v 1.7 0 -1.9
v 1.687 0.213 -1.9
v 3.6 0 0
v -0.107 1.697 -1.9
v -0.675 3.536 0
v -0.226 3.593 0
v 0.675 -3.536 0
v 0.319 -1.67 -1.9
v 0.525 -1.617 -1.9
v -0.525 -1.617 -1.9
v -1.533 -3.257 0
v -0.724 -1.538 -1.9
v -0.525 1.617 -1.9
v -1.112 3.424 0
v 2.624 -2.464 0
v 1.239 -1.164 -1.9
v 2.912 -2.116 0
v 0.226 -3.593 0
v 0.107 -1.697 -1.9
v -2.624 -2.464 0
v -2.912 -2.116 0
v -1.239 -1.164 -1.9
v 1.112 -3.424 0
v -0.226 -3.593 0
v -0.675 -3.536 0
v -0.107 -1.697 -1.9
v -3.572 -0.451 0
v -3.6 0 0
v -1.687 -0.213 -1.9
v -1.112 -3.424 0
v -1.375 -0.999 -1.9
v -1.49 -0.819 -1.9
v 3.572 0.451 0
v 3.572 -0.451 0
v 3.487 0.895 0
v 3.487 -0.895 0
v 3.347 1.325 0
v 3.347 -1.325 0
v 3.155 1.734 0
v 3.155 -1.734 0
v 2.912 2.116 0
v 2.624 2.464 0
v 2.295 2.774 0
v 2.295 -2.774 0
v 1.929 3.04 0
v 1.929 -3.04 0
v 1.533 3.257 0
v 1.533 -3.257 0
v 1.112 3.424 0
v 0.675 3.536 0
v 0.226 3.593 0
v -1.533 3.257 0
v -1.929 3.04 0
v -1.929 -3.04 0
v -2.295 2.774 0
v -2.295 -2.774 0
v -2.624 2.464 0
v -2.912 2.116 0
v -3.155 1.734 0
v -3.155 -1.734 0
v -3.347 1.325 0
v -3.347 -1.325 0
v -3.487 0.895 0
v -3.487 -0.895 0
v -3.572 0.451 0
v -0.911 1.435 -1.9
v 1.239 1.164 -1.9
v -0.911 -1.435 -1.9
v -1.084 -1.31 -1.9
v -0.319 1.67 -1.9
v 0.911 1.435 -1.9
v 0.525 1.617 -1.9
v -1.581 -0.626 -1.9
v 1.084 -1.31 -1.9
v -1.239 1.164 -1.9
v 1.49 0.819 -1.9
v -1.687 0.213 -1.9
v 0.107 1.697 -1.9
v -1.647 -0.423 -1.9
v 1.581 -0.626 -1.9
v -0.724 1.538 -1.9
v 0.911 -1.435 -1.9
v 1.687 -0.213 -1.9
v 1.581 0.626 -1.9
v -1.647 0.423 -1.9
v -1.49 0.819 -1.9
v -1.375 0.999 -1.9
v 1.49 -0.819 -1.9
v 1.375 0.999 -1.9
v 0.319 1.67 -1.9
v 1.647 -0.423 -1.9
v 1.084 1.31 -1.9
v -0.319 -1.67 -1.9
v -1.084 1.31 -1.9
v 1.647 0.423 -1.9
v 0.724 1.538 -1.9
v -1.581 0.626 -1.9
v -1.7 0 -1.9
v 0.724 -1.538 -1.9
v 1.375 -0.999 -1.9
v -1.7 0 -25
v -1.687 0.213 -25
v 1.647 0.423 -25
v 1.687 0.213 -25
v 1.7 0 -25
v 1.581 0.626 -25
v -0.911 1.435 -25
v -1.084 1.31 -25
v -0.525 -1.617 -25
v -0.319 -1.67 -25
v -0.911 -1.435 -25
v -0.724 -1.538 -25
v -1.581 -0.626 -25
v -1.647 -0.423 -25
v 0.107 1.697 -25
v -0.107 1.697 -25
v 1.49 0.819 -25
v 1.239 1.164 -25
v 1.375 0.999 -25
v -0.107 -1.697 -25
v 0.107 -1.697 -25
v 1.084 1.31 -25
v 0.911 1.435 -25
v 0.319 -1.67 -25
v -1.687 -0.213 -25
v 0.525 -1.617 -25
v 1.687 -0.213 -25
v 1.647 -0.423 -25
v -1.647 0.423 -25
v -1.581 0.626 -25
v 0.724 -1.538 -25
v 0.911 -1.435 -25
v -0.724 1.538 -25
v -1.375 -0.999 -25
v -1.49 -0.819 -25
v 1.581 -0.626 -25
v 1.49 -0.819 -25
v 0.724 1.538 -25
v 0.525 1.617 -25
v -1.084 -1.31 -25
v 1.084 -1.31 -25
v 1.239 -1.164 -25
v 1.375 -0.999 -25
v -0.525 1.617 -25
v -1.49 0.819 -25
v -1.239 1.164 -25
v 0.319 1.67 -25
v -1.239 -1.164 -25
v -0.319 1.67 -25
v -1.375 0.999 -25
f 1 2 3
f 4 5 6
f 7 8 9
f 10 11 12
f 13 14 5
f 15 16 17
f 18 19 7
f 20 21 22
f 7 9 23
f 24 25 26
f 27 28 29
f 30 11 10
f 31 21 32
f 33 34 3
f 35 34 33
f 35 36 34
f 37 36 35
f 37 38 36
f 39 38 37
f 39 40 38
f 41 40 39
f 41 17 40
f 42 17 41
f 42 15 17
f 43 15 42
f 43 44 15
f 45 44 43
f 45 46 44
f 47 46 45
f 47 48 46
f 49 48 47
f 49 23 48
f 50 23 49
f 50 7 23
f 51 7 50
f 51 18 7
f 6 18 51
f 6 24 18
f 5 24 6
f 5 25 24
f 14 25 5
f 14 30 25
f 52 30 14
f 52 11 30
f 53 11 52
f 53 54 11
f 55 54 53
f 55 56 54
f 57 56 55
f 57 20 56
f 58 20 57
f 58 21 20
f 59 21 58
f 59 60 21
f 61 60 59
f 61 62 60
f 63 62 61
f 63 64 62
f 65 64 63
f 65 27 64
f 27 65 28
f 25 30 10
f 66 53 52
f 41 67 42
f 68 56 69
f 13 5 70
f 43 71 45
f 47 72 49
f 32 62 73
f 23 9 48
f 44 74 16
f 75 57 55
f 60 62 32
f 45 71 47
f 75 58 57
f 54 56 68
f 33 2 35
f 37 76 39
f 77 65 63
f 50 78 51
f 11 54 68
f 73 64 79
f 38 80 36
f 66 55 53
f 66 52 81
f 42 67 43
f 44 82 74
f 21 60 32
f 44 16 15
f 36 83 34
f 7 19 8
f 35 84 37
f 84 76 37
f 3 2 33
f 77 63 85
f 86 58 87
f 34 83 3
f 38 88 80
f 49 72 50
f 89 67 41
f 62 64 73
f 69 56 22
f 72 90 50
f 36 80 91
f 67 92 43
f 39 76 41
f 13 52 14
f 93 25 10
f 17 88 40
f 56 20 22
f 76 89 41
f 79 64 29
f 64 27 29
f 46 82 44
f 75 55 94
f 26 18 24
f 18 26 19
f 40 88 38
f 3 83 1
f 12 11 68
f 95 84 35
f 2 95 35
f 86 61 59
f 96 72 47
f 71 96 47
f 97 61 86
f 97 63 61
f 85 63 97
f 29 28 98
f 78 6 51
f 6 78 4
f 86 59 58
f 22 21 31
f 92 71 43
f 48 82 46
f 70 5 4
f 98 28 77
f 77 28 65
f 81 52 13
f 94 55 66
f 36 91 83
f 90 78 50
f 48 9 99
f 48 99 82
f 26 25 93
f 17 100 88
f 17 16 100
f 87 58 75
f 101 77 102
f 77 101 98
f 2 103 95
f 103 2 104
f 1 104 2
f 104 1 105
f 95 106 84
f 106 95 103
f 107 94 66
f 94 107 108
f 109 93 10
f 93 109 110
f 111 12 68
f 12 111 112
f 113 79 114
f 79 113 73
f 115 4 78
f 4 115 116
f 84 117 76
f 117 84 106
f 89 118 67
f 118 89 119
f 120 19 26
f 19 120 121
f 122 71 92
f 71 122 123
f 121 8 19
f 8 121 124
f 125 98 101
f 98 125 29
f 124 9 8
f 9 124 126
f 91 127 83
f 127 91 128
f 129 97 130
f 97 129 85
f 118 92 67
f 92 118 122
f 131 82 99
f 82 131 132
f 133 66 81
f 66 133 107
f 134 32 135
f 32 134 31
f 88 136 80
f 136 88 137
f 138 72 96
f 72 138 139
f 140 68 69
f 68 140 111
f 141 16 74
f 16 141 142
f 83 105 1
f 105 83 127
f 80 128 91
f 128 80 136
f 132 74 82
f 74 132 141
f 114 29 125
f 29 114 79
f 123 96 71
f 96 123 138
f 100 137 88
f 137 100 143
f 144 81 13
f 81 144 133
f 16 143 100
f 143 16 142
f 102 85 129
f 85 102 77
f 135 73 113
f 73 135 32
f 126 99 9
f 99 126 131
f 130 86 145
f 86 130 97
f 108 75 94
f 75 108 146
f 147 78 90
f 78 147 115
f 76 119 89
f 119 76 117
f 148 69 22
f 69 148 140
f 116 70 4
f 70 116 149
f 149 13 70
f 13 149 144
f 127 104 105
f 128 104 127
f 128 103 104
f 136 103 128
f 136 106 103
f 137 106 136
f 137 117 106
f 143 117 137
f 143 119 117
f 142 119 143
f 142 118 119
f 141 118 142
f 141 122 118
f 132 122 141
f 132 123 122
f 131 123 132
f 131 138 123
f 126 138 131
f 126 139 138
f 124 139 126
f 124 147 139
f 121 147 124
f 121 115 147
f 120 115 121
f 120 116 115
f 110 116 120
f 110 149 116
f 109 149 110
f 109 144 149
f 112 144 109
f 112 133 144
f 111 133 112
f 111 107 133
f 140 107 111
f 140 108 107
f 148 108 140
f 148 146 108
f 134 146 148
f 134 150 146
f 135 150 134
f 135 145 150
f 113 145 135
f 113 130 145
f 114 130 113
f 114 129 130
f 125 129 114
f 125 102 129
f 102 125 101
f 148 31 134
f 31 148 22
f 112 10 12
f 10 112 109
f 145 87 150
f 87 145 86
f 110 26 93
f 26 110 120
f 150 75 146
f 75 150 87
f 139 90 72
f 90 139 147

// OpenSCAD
// Generated by SolidPython 1.1.3 on 2023-03-13 21:43:02
$fn = 50;


difference() {
	union() {
		translate(v = [0, 0, -1.9000000000]) {
			rotate(a = [0, 0, 0]) {
				cylinder(h = 1.9000000000, r1 = 1.7000000000, r2 = 3.6000000000);
			}
		}
		translate(v = [0, 0, -25]) {
			rotate(a = [0, 0, 0]) {
				cylinder(h = 25, r = 1.7000000000);
			}
		}
	}
	union();
}
/***********************************************
*********      SolidPython code:      **********
************************************************
 
from solid import *
import os
import subprocess

import oomB

import opsc_library_gen

mode = "laser"
#mode = "3d_print"

defined_objects = {}

radius_dict = {}
countersunk_dict = {}


def set_mode(m):
    global mode
    mode = m
    radius_dict['M6'] = 6.5/2
    radius_dict['M3'] = 3.3/2
    if mode == "laser":
        radius_dict['M6'] = 6/2
        radius_dict['M3'] = 3/2

    countersunk_dict['M3'] = {}
    countersunk_dict['M3']['little_rad'] = radius_dict['M3']
    countersunk_dict['M3']['big_rad'] = (5.5+0.6)/2
    if mode == "laser":
        countersunk_dict['M3']['big_rad'] = (4.75+0.6)/2
        countersunk_dict['M3']['little_rad'] = (4.75+0.6)/2

    countersunk_dict['M3']['height'] = 1.7


def opsc_make_object(filename, objects, save_type="none",resolution=50, layers = 1, tilediff = 200, mode="laser", overwrite=True):
    if overwrite or not os.path.exists(filename):
        set_mode(mode)
        save_type = save_type.lower()
        os.makedirs(os.path.dirname(filename), exist_ok=True)
        final_object = opsc_get_object(objects, mode = mode)
        # Save the final object to the specified filename    
        scad_render_to_file(final_object, filename, file_header='$fn = %s;' % resolution, include_orig_code=True)
        if save_type == "all":
            saveToAll(filename)
        elif save_type == "dxf":
            saveToDxf(filename)
        if mode == "laser":
            filename_laser = filename.replace(".scad","-flat.scad")
            scad_render_to_file(getLaser(final_object, layers=layers, tilediff=tilediff), filename_laser, file_header='$fn = %s;' % resolution, include_orig_code=True)
            if save_type == "all":
                saveToAll(filename_laser)
            elif save_type == "dxf":
                saveToDxf(filename_laser)


def opsc_get_object(objects, mode = "laser"):
    # Create the solidpython objects only include the positive objects and if they don't have inclusion or their inclusion is either all or mode
    # Initialize an empty list to store the results
    positive_objects = []

    # Iterate over the "objects" list
    for obj in objects:
        # Check if the current object has a "type" key with a value of "positive"
        if obj['type'] == 'positive':
            # Check if the current object has an "inclusion" key and its value matches "mode",
            # or if the current object does not have an "inclusion" key at all
            if not 'inclusion' in obj or obj['inclusion'] == "all" or obj['inclusion'] == mode:
                # Call the "get_opsc_item" function with the current object as an argument
                opsc_item = get_opsc_item(obj)
                # Add the result to the "positive_objects" list
                positive_objects.append(opsc_item)
# Initialize an empty list to store the results
    negative_objects = []

    # Iterate over the "objects" list
    for obj in objects:
        # Check if the current object has a "type" key with a value of "negative"
        if obj['type'] == 'negative':
            # Check if the current object has an "inclusion" key and its value matches "mode",
            # or if the current object does not have an "inclusion" key at all
            if not 'inclusion' in obj or obj['inclusion'] == "all" or obj['inclusion'] == mode:
                # Call the "get_opsc_item" function with the current object as an argument
                opsc_item = get_opsc_item(obj)
                # Add the result to the "negative_objects" list
                negative_objects.append(opsc_item)
    
    #positive_objects = [get_opsc_item(obj) for obj in objects if obj['type'] == 'positive']
    #negative_objects = [get_opsc_item(obj) for obj in objects if obj['type'] == 'negative']
    # Union the positive objects
    positive_object = union()(*positive_objects)
    # Union the negative objects
    negative_object = union()(*negative_objects)
    # Create the final object by subtracting the negative objects from the positive objects
    return difference()(positive_object, negative_object)

def get_opsc_item(params):
    # A dictionary to map radius string values to numerical values
    #radius_dict = {'small': 5, 'medium': 10, 'large': 15}
    # An array of function names for basic shapes
    basic_shapes = ['cube', 'sphere', 'cylinder']
    
    # An array of function names for other shapes
    other_shapes = ['hole', 'slot', 'rounded_rectangle', 'countersunk', 'polyg']
    


    # Convert radius to r if present, and remove radius from the params dictionary
    if 'radius' in params:
        if isinstance(params['radius'], str):
            # Use the radius_dict to map the radius string value to a numerical value
            params['r'] = radius_dict[params['radius']]
        else:
            params['r'] = params['radius']
        del params['radius']
    

    # Check if the object type is a basic shape
    if params['shape'] in basic_shapes:
        # Remove shape and unexpected dictionary values
        allowed_keys = {'size', 'r', 'r1', 'r2', 'd', 'h', 'rw', 'rh', 'dw', 'dh'}
        shape_params = {k: v for k, v in params.items() if k in allowed_keys}

        #params['m'] = "#"
        ###split for adding modifier
        try:
            m = params['m']
            func = globals()[params['shape']]
            return_value = get_opsc_transform(params,func(**shape_params))
            return_value = (return_value).set_modifier(m)
            return return_value
        except KeyError as e:
            return get_opsc_transform(params,globals()[params['shape']](**shape_params))
        
    elif params['shape'] == 'polygon':
        # Remove shape and unexpected dictionary values
        h  = params['height']
        allowed_keys = {'points'}
        shape_params = {k: v for k, v in params.items() if k in allowed_keys}

        # Call the corresponding function for the shape parameter, using ** notation to pass the shape_params dictionary as keyword arguments
        params["rot"] = [0,0,0]        
        try:
            m = params['m']
            func = globals()[params['shape']]
            return_value = get_opsc_transform(params,linear_extrude(h)(globals()[params['shape']](**shape_params)))
            return_value = (return_value).set_modifier(m)
            return return_value
        except KeyError as e:
            return_value = get_opsc_transform(params,linear_extrude(h)(globals()[params['shape']](**shape_params)))
            return_value = (return_value)
            return return_value


    # If the object type is not a basic shape, check if it's a defined object or one of the other shapes
    elif params['shape'] in other_shapes:
        # Call the corresponding function for the shape parameter, passing the params dictionary as an argument
        p2 = copy.deepcopy(params)
        p2["pos"] = [0,0,0]
        return get_opsc_transform(params,globals()[params['shape']](p2))
    
    # If the object is not a basic shape or a defined object, try to import it from a .scad file
    else:
        obj = defined_objects[params['shape']]
        return get_opsc_transform(params,obj)

def get_opsc_transform(params, solid_obj):
    # Rotate the object based on the 'rot' field in the params dictionary, or the 'rotX', 'rotY', and 'rotZ' fields if 'rot' is not present
    rot = params.get('rot', [])
    if rot:
        rotX, rotY, rotZ = rot
    else:
        rotX = params.get('rotX', 0)
        rotY = params.get('rotY', 0)
        rotZ = params.get('rotZ', 0)
    solid_obj = rotate([rotX, rotY, rotZ])(solid_obj)

    # Translate the object based on the 'pos' field in the params dictionary, or the 'x', 'y', and 'z' fields if 'pos' is not present
    pos = params.get('pos', [])
    if pos:
        x, y, z = pos
    else:
        x = params.get('x', 0)
        y = params.get('y', 0)
        z = params.get('z', 0)
    solid_obj = translate([x, y, z])(solid_obj)
    return solid_obj


import random

def opsc_easy_array(type, shape, repeats, pos_start, shift_arr, **kwargs):
    for i in range(0,3):
        repeats.append(1)
        pos_start.append(0)
        shift_arr.append(0)
    return_objects = []

    for x in range(0,repeats[0]):
        for y in range(0,repeats[1]):
            for z in range(0,repeats[2]):
                return_objects.append(opsc_easy(type, shape, pos=[pos_start[0]+x*shift_arr[0],pos_start[1]+y*shift_arr[1],pos_start[2]+z*shift_arr[2]], **kwargs))
    return return_objects                



def opsc_easy(type, shape, **kwargs):
    obj = {
        'type': type,
        'shape': shape
    }
    for param in ['size', 'r', 'r1', 'r2', 'd', 'h', 'rw', 'rh', 'dw', 'dh', 'pos', 'x', 'y', 'z', 'rot', 'rotX', 'rotY', 'rotZ', "w", "inclusion", 'sides', 'height', "m"]:
        if param in kwargs:
            obj[param] = kwargs[param]
    return obj

def hole(params):
    p2 = copy.deepcopy(params)  
    # Check if the radius is a string and replace it with the corresponding value from the dictionary
    if isinstance(p2['r'], str):
        p2['r'] = radius_dict[p2['r']]
    
    # Set the height to 100 if not specified
    if 'h' not in p2:
        p2['h'] = 100
        p2["pos"] = [0,0,-50]
    p2["center"] = True
    # Create the cylinder object
    p2["shape"] = "cylinder"
    p2["type"] = "positive"

    return get_opsc_item(p2)

import copy

def countersunk(params):
    p2 = copy.deepcopy(params)
    counter_rad = p2['r']
    p2['r'] = radius_dict[p2['r']]
    hp = copy.deepcopy(p2)
    hp["type"] = "positive"
    hp["shape"] = "hole"
    del hp["rot"]
    hol = get_opsc_item(hp)
    
    cp = copy.deepcopy(p2)
    cp["h"] = countersunk_dict[counter_rad]["height"]
    cp["r2"] = countersunk_dict[counter_rad]["little_rad"]
    cp["r1"] = countersunk_dict[counter_rad]["big_rad"]
    del cp["r"]
    del cp["rot"]
    cp["type"] = "positive"
    cp["shape"] = "cylinder"
    cp["pos"] = [0,0,0]

    top = get_opsc_item(cp)
    return union()(hol,top)



def slot(params):  
    p2 = copy.deepcopy(params) 
    if isinstance(p2['r'], str):
        p2['r'] = radius_dict[p2['r']]
    p2["type"] = "positive"
    p2["shape"] = "hole"
    del p2["rot"]
    p2["pos"] = [0,0,0]
    left = copy.deepcopy(p2)
    right = copy.deepcopy(p2)
    left["pos"][0] = p2["w"] / 2 - p2["r"] 
    
    right["pos"][0] = -p2["w"] / 2 + p2["r"] 
    pass
    leftObj = get_opsc_item(left)
    rightObj = get_opsc_item(right)
    return hull()(leftObj, rightObj)

def rounded_rectangle(params):   
    p2 = copy.deepcopy(params) 
    p2["h"] = p2["size"][2]
    p2["pos"] = p2.get("pos", [0, 0, 0]) 
    p2["type"] = "positive"
    p2["shape"] = "hole"
    p2["pos"] = [0,0,0]
    
    if 'rot' in p2:
        del p2["rot"]   
    if 'r' not in p2:
        p2["r"] = 5 
    tl = copy.deepcopy(p2)
    tr = copy.deepcopy(p2)
    bl = copy.deepcopy(p2)
    br = copy.deepcopy(p2)
    tl["pos"][0] = -(p2["size"][0] - p2["r"]*2)/2
    tl["pos"][1] = (p2["size"][1] - p2["r"]*2)/2
    tr["pos"][0] = (p2["size"][0] - p2["r"]*2)/2
    tr["pos"][1] = (p2["size"][1] - p2["r"]*2)/2
    bl["pos"][0] = -(p2["size"][0] - p2["r"]*2)/2
    bl["pos"][1] = -(p2["size"][1] - p2["r"]*2)/2
    br["pos"][0] = (p2["size"][0] - p2["r"]*2)/2
    br["pos"][1] = -(p2["size"][1] - p2["r"]*2)/2
    del tl["size"]
    del tr["size"]
    del bl["size"]
    del br["size"]
    tlo = get_opsc_item(tl)
    tro = get_opsc_item(tr)
    blo = get_opsc_item(bl)
    bro = get_opsc_item(br)    
    return hull()(tlo, tro, blo, bro)



def polyg(params):
    p2 = copy.deepcopy(params) 
    p2["type"] = "positive"
    p2["shape"] = "polygon"
    p2["pos"] = [0,0,0]
    sides = p2["sides"]
    radius = p2["r"]    
    angles = [i * 360 / sides for i in range(sides)]
    points = regular_polygon(sides, radius)
    
    p2["points"] = points
    return get_opsc_item(p2)

import math

def regular_polygon(num_sides, radius):
    # Calculate the angle between each side
    angle = 2 * math.pi / num_sides

    # Calculate the points of the polygon
    points = []
    for i in range(num_sides):
        x = radius * math.cos(i * angle)
        y = radius * math.sin(i * angle)
        points.append((x, y))
    return points

def import_scad_object(filename):
    # Import the .scad file and convert it to a solidpython object
    #filename = "parts"
    obj = import_scad(filename)
    return obj.main()



import os
import solid as solidpython

# A dictionary to store the defined objects


def load_scad_objects():
    opsc_library_gen.gen_library(defined_objects)

import random

def test(num_objects):
    objects = []
    for i in range(num_objects):
        # Choose a random shape
        #shape = random.choice(['cube', 'sphere', 'cylinder', 'hole', 'slot', "rounded_rectangle"])
        shape = random.choice(["rounded_rectangle"])

        # Choose a random type
        type = random.choice(['positive', 'negative'])
        
        # Create an empty object dictionary
        obj = {'shape': shape, 'type': type}
        
        # Set shape-specific parameters
        if obj['shape'] in ['cube']:
            obj['size'] =  [random.uniform(5, 15), random.uniform(5, 15), random.uniform(5, 15)]
        if obj['shape'] in ['rounded_rectangle']:
            obj['size'] =  [random.uniform(5, 15), random.uniform(5, 15), random.uniform(5, 15)]
            obj['r'] = random.uniform(0.5, 5)
        elif obj['shape'] == 'sphere':
            obj['r'] = random.uniform(5, 15)
        elif obj['shape'] in ['cylinder', 'hole']:
            obj['r'] = random.uniform(0.5, 5)
            obj['h'] = random.uniform(5, 15)
        elif obj['shape'] == 'slot':
            obj['r'] = random.uniform(0.5, 5)
            obj['h'] = random.uniform(5, 15)
            obj['w'] = random.uniform(5, 15)
        
        # Set a random position and rotation
        obj['pos'] = [random.uniform(-20, 20), random.uniform(-20, 20), random.uniform(-20, 20)]
        obj['rot'] = [random.uniform(-180, 180), random.uniform(-180, 180), random.uniform(-180, 180)]
        
        # Add the object to the list
        objects.append(obj)
    return objects

####### old file saving
def saveToAll(fileIn):
    saveToStl(fileIn)
    saveToDxf(fileIn)
    saveToPng(fileIn)
    saveToSvg(fileIn)

def saveToDxf(fileIn, fileOut="", copy_to_laser=True):
    if fileOut == "":
        fileOut = fileIn.replace(".scad",".dxf")
    saveToFile(fileIn, fileOut)


    
def saveToPng(fileIn, fileOut="",extra="--render"):
    if fileOut == "":
        fileOut = fileIn.replace(".scad",".png")
    saveToFile(fileIn, fileOut)

def saveToStl(fileIn, fileOut=""):
    if fileOut == "":
        fileOut = fileIn.replace(".scad",".stl")
    saveToFile(fileIn, fileOut)
    
def saveToSvg(fileIn, fileOut=""):
    if fileOut == "":
        fileOut = fileIn.replace(".scad",".svg")
    saveToFile(fileIn, fileOut)

def saveToFile(fileIn, fileOut,extra=""):
    #extra = extra + " --colorscheme Tomorrow"

    launchStr = 'openscad -o "' + fileOut + '"' + extra + ' "' + fileIn + '"'
    if ".png" in fileOut:
        launchStr = launchStr + " --render"
    print("            saveToFile launch string: " + launchStr)
    subprocess.run(launchStr)
    x=0

def getLaser(final_object,start=1.5,layers=1,thickness=3,tilediff=200):
        rv= []

        for x in range(layers):
            rv.append(translate([0,x*tilediff,0])(
                    projection()(
                        intersection()(translate([-500,-500,start+x*thickness])(cube(size=[1000,1000,0.1])),
                            final_object
                        )
                    )
            )
            )
            
        return union()(rv)

set_mode("laser")
load_scad_objects() 
 
************************************************/
